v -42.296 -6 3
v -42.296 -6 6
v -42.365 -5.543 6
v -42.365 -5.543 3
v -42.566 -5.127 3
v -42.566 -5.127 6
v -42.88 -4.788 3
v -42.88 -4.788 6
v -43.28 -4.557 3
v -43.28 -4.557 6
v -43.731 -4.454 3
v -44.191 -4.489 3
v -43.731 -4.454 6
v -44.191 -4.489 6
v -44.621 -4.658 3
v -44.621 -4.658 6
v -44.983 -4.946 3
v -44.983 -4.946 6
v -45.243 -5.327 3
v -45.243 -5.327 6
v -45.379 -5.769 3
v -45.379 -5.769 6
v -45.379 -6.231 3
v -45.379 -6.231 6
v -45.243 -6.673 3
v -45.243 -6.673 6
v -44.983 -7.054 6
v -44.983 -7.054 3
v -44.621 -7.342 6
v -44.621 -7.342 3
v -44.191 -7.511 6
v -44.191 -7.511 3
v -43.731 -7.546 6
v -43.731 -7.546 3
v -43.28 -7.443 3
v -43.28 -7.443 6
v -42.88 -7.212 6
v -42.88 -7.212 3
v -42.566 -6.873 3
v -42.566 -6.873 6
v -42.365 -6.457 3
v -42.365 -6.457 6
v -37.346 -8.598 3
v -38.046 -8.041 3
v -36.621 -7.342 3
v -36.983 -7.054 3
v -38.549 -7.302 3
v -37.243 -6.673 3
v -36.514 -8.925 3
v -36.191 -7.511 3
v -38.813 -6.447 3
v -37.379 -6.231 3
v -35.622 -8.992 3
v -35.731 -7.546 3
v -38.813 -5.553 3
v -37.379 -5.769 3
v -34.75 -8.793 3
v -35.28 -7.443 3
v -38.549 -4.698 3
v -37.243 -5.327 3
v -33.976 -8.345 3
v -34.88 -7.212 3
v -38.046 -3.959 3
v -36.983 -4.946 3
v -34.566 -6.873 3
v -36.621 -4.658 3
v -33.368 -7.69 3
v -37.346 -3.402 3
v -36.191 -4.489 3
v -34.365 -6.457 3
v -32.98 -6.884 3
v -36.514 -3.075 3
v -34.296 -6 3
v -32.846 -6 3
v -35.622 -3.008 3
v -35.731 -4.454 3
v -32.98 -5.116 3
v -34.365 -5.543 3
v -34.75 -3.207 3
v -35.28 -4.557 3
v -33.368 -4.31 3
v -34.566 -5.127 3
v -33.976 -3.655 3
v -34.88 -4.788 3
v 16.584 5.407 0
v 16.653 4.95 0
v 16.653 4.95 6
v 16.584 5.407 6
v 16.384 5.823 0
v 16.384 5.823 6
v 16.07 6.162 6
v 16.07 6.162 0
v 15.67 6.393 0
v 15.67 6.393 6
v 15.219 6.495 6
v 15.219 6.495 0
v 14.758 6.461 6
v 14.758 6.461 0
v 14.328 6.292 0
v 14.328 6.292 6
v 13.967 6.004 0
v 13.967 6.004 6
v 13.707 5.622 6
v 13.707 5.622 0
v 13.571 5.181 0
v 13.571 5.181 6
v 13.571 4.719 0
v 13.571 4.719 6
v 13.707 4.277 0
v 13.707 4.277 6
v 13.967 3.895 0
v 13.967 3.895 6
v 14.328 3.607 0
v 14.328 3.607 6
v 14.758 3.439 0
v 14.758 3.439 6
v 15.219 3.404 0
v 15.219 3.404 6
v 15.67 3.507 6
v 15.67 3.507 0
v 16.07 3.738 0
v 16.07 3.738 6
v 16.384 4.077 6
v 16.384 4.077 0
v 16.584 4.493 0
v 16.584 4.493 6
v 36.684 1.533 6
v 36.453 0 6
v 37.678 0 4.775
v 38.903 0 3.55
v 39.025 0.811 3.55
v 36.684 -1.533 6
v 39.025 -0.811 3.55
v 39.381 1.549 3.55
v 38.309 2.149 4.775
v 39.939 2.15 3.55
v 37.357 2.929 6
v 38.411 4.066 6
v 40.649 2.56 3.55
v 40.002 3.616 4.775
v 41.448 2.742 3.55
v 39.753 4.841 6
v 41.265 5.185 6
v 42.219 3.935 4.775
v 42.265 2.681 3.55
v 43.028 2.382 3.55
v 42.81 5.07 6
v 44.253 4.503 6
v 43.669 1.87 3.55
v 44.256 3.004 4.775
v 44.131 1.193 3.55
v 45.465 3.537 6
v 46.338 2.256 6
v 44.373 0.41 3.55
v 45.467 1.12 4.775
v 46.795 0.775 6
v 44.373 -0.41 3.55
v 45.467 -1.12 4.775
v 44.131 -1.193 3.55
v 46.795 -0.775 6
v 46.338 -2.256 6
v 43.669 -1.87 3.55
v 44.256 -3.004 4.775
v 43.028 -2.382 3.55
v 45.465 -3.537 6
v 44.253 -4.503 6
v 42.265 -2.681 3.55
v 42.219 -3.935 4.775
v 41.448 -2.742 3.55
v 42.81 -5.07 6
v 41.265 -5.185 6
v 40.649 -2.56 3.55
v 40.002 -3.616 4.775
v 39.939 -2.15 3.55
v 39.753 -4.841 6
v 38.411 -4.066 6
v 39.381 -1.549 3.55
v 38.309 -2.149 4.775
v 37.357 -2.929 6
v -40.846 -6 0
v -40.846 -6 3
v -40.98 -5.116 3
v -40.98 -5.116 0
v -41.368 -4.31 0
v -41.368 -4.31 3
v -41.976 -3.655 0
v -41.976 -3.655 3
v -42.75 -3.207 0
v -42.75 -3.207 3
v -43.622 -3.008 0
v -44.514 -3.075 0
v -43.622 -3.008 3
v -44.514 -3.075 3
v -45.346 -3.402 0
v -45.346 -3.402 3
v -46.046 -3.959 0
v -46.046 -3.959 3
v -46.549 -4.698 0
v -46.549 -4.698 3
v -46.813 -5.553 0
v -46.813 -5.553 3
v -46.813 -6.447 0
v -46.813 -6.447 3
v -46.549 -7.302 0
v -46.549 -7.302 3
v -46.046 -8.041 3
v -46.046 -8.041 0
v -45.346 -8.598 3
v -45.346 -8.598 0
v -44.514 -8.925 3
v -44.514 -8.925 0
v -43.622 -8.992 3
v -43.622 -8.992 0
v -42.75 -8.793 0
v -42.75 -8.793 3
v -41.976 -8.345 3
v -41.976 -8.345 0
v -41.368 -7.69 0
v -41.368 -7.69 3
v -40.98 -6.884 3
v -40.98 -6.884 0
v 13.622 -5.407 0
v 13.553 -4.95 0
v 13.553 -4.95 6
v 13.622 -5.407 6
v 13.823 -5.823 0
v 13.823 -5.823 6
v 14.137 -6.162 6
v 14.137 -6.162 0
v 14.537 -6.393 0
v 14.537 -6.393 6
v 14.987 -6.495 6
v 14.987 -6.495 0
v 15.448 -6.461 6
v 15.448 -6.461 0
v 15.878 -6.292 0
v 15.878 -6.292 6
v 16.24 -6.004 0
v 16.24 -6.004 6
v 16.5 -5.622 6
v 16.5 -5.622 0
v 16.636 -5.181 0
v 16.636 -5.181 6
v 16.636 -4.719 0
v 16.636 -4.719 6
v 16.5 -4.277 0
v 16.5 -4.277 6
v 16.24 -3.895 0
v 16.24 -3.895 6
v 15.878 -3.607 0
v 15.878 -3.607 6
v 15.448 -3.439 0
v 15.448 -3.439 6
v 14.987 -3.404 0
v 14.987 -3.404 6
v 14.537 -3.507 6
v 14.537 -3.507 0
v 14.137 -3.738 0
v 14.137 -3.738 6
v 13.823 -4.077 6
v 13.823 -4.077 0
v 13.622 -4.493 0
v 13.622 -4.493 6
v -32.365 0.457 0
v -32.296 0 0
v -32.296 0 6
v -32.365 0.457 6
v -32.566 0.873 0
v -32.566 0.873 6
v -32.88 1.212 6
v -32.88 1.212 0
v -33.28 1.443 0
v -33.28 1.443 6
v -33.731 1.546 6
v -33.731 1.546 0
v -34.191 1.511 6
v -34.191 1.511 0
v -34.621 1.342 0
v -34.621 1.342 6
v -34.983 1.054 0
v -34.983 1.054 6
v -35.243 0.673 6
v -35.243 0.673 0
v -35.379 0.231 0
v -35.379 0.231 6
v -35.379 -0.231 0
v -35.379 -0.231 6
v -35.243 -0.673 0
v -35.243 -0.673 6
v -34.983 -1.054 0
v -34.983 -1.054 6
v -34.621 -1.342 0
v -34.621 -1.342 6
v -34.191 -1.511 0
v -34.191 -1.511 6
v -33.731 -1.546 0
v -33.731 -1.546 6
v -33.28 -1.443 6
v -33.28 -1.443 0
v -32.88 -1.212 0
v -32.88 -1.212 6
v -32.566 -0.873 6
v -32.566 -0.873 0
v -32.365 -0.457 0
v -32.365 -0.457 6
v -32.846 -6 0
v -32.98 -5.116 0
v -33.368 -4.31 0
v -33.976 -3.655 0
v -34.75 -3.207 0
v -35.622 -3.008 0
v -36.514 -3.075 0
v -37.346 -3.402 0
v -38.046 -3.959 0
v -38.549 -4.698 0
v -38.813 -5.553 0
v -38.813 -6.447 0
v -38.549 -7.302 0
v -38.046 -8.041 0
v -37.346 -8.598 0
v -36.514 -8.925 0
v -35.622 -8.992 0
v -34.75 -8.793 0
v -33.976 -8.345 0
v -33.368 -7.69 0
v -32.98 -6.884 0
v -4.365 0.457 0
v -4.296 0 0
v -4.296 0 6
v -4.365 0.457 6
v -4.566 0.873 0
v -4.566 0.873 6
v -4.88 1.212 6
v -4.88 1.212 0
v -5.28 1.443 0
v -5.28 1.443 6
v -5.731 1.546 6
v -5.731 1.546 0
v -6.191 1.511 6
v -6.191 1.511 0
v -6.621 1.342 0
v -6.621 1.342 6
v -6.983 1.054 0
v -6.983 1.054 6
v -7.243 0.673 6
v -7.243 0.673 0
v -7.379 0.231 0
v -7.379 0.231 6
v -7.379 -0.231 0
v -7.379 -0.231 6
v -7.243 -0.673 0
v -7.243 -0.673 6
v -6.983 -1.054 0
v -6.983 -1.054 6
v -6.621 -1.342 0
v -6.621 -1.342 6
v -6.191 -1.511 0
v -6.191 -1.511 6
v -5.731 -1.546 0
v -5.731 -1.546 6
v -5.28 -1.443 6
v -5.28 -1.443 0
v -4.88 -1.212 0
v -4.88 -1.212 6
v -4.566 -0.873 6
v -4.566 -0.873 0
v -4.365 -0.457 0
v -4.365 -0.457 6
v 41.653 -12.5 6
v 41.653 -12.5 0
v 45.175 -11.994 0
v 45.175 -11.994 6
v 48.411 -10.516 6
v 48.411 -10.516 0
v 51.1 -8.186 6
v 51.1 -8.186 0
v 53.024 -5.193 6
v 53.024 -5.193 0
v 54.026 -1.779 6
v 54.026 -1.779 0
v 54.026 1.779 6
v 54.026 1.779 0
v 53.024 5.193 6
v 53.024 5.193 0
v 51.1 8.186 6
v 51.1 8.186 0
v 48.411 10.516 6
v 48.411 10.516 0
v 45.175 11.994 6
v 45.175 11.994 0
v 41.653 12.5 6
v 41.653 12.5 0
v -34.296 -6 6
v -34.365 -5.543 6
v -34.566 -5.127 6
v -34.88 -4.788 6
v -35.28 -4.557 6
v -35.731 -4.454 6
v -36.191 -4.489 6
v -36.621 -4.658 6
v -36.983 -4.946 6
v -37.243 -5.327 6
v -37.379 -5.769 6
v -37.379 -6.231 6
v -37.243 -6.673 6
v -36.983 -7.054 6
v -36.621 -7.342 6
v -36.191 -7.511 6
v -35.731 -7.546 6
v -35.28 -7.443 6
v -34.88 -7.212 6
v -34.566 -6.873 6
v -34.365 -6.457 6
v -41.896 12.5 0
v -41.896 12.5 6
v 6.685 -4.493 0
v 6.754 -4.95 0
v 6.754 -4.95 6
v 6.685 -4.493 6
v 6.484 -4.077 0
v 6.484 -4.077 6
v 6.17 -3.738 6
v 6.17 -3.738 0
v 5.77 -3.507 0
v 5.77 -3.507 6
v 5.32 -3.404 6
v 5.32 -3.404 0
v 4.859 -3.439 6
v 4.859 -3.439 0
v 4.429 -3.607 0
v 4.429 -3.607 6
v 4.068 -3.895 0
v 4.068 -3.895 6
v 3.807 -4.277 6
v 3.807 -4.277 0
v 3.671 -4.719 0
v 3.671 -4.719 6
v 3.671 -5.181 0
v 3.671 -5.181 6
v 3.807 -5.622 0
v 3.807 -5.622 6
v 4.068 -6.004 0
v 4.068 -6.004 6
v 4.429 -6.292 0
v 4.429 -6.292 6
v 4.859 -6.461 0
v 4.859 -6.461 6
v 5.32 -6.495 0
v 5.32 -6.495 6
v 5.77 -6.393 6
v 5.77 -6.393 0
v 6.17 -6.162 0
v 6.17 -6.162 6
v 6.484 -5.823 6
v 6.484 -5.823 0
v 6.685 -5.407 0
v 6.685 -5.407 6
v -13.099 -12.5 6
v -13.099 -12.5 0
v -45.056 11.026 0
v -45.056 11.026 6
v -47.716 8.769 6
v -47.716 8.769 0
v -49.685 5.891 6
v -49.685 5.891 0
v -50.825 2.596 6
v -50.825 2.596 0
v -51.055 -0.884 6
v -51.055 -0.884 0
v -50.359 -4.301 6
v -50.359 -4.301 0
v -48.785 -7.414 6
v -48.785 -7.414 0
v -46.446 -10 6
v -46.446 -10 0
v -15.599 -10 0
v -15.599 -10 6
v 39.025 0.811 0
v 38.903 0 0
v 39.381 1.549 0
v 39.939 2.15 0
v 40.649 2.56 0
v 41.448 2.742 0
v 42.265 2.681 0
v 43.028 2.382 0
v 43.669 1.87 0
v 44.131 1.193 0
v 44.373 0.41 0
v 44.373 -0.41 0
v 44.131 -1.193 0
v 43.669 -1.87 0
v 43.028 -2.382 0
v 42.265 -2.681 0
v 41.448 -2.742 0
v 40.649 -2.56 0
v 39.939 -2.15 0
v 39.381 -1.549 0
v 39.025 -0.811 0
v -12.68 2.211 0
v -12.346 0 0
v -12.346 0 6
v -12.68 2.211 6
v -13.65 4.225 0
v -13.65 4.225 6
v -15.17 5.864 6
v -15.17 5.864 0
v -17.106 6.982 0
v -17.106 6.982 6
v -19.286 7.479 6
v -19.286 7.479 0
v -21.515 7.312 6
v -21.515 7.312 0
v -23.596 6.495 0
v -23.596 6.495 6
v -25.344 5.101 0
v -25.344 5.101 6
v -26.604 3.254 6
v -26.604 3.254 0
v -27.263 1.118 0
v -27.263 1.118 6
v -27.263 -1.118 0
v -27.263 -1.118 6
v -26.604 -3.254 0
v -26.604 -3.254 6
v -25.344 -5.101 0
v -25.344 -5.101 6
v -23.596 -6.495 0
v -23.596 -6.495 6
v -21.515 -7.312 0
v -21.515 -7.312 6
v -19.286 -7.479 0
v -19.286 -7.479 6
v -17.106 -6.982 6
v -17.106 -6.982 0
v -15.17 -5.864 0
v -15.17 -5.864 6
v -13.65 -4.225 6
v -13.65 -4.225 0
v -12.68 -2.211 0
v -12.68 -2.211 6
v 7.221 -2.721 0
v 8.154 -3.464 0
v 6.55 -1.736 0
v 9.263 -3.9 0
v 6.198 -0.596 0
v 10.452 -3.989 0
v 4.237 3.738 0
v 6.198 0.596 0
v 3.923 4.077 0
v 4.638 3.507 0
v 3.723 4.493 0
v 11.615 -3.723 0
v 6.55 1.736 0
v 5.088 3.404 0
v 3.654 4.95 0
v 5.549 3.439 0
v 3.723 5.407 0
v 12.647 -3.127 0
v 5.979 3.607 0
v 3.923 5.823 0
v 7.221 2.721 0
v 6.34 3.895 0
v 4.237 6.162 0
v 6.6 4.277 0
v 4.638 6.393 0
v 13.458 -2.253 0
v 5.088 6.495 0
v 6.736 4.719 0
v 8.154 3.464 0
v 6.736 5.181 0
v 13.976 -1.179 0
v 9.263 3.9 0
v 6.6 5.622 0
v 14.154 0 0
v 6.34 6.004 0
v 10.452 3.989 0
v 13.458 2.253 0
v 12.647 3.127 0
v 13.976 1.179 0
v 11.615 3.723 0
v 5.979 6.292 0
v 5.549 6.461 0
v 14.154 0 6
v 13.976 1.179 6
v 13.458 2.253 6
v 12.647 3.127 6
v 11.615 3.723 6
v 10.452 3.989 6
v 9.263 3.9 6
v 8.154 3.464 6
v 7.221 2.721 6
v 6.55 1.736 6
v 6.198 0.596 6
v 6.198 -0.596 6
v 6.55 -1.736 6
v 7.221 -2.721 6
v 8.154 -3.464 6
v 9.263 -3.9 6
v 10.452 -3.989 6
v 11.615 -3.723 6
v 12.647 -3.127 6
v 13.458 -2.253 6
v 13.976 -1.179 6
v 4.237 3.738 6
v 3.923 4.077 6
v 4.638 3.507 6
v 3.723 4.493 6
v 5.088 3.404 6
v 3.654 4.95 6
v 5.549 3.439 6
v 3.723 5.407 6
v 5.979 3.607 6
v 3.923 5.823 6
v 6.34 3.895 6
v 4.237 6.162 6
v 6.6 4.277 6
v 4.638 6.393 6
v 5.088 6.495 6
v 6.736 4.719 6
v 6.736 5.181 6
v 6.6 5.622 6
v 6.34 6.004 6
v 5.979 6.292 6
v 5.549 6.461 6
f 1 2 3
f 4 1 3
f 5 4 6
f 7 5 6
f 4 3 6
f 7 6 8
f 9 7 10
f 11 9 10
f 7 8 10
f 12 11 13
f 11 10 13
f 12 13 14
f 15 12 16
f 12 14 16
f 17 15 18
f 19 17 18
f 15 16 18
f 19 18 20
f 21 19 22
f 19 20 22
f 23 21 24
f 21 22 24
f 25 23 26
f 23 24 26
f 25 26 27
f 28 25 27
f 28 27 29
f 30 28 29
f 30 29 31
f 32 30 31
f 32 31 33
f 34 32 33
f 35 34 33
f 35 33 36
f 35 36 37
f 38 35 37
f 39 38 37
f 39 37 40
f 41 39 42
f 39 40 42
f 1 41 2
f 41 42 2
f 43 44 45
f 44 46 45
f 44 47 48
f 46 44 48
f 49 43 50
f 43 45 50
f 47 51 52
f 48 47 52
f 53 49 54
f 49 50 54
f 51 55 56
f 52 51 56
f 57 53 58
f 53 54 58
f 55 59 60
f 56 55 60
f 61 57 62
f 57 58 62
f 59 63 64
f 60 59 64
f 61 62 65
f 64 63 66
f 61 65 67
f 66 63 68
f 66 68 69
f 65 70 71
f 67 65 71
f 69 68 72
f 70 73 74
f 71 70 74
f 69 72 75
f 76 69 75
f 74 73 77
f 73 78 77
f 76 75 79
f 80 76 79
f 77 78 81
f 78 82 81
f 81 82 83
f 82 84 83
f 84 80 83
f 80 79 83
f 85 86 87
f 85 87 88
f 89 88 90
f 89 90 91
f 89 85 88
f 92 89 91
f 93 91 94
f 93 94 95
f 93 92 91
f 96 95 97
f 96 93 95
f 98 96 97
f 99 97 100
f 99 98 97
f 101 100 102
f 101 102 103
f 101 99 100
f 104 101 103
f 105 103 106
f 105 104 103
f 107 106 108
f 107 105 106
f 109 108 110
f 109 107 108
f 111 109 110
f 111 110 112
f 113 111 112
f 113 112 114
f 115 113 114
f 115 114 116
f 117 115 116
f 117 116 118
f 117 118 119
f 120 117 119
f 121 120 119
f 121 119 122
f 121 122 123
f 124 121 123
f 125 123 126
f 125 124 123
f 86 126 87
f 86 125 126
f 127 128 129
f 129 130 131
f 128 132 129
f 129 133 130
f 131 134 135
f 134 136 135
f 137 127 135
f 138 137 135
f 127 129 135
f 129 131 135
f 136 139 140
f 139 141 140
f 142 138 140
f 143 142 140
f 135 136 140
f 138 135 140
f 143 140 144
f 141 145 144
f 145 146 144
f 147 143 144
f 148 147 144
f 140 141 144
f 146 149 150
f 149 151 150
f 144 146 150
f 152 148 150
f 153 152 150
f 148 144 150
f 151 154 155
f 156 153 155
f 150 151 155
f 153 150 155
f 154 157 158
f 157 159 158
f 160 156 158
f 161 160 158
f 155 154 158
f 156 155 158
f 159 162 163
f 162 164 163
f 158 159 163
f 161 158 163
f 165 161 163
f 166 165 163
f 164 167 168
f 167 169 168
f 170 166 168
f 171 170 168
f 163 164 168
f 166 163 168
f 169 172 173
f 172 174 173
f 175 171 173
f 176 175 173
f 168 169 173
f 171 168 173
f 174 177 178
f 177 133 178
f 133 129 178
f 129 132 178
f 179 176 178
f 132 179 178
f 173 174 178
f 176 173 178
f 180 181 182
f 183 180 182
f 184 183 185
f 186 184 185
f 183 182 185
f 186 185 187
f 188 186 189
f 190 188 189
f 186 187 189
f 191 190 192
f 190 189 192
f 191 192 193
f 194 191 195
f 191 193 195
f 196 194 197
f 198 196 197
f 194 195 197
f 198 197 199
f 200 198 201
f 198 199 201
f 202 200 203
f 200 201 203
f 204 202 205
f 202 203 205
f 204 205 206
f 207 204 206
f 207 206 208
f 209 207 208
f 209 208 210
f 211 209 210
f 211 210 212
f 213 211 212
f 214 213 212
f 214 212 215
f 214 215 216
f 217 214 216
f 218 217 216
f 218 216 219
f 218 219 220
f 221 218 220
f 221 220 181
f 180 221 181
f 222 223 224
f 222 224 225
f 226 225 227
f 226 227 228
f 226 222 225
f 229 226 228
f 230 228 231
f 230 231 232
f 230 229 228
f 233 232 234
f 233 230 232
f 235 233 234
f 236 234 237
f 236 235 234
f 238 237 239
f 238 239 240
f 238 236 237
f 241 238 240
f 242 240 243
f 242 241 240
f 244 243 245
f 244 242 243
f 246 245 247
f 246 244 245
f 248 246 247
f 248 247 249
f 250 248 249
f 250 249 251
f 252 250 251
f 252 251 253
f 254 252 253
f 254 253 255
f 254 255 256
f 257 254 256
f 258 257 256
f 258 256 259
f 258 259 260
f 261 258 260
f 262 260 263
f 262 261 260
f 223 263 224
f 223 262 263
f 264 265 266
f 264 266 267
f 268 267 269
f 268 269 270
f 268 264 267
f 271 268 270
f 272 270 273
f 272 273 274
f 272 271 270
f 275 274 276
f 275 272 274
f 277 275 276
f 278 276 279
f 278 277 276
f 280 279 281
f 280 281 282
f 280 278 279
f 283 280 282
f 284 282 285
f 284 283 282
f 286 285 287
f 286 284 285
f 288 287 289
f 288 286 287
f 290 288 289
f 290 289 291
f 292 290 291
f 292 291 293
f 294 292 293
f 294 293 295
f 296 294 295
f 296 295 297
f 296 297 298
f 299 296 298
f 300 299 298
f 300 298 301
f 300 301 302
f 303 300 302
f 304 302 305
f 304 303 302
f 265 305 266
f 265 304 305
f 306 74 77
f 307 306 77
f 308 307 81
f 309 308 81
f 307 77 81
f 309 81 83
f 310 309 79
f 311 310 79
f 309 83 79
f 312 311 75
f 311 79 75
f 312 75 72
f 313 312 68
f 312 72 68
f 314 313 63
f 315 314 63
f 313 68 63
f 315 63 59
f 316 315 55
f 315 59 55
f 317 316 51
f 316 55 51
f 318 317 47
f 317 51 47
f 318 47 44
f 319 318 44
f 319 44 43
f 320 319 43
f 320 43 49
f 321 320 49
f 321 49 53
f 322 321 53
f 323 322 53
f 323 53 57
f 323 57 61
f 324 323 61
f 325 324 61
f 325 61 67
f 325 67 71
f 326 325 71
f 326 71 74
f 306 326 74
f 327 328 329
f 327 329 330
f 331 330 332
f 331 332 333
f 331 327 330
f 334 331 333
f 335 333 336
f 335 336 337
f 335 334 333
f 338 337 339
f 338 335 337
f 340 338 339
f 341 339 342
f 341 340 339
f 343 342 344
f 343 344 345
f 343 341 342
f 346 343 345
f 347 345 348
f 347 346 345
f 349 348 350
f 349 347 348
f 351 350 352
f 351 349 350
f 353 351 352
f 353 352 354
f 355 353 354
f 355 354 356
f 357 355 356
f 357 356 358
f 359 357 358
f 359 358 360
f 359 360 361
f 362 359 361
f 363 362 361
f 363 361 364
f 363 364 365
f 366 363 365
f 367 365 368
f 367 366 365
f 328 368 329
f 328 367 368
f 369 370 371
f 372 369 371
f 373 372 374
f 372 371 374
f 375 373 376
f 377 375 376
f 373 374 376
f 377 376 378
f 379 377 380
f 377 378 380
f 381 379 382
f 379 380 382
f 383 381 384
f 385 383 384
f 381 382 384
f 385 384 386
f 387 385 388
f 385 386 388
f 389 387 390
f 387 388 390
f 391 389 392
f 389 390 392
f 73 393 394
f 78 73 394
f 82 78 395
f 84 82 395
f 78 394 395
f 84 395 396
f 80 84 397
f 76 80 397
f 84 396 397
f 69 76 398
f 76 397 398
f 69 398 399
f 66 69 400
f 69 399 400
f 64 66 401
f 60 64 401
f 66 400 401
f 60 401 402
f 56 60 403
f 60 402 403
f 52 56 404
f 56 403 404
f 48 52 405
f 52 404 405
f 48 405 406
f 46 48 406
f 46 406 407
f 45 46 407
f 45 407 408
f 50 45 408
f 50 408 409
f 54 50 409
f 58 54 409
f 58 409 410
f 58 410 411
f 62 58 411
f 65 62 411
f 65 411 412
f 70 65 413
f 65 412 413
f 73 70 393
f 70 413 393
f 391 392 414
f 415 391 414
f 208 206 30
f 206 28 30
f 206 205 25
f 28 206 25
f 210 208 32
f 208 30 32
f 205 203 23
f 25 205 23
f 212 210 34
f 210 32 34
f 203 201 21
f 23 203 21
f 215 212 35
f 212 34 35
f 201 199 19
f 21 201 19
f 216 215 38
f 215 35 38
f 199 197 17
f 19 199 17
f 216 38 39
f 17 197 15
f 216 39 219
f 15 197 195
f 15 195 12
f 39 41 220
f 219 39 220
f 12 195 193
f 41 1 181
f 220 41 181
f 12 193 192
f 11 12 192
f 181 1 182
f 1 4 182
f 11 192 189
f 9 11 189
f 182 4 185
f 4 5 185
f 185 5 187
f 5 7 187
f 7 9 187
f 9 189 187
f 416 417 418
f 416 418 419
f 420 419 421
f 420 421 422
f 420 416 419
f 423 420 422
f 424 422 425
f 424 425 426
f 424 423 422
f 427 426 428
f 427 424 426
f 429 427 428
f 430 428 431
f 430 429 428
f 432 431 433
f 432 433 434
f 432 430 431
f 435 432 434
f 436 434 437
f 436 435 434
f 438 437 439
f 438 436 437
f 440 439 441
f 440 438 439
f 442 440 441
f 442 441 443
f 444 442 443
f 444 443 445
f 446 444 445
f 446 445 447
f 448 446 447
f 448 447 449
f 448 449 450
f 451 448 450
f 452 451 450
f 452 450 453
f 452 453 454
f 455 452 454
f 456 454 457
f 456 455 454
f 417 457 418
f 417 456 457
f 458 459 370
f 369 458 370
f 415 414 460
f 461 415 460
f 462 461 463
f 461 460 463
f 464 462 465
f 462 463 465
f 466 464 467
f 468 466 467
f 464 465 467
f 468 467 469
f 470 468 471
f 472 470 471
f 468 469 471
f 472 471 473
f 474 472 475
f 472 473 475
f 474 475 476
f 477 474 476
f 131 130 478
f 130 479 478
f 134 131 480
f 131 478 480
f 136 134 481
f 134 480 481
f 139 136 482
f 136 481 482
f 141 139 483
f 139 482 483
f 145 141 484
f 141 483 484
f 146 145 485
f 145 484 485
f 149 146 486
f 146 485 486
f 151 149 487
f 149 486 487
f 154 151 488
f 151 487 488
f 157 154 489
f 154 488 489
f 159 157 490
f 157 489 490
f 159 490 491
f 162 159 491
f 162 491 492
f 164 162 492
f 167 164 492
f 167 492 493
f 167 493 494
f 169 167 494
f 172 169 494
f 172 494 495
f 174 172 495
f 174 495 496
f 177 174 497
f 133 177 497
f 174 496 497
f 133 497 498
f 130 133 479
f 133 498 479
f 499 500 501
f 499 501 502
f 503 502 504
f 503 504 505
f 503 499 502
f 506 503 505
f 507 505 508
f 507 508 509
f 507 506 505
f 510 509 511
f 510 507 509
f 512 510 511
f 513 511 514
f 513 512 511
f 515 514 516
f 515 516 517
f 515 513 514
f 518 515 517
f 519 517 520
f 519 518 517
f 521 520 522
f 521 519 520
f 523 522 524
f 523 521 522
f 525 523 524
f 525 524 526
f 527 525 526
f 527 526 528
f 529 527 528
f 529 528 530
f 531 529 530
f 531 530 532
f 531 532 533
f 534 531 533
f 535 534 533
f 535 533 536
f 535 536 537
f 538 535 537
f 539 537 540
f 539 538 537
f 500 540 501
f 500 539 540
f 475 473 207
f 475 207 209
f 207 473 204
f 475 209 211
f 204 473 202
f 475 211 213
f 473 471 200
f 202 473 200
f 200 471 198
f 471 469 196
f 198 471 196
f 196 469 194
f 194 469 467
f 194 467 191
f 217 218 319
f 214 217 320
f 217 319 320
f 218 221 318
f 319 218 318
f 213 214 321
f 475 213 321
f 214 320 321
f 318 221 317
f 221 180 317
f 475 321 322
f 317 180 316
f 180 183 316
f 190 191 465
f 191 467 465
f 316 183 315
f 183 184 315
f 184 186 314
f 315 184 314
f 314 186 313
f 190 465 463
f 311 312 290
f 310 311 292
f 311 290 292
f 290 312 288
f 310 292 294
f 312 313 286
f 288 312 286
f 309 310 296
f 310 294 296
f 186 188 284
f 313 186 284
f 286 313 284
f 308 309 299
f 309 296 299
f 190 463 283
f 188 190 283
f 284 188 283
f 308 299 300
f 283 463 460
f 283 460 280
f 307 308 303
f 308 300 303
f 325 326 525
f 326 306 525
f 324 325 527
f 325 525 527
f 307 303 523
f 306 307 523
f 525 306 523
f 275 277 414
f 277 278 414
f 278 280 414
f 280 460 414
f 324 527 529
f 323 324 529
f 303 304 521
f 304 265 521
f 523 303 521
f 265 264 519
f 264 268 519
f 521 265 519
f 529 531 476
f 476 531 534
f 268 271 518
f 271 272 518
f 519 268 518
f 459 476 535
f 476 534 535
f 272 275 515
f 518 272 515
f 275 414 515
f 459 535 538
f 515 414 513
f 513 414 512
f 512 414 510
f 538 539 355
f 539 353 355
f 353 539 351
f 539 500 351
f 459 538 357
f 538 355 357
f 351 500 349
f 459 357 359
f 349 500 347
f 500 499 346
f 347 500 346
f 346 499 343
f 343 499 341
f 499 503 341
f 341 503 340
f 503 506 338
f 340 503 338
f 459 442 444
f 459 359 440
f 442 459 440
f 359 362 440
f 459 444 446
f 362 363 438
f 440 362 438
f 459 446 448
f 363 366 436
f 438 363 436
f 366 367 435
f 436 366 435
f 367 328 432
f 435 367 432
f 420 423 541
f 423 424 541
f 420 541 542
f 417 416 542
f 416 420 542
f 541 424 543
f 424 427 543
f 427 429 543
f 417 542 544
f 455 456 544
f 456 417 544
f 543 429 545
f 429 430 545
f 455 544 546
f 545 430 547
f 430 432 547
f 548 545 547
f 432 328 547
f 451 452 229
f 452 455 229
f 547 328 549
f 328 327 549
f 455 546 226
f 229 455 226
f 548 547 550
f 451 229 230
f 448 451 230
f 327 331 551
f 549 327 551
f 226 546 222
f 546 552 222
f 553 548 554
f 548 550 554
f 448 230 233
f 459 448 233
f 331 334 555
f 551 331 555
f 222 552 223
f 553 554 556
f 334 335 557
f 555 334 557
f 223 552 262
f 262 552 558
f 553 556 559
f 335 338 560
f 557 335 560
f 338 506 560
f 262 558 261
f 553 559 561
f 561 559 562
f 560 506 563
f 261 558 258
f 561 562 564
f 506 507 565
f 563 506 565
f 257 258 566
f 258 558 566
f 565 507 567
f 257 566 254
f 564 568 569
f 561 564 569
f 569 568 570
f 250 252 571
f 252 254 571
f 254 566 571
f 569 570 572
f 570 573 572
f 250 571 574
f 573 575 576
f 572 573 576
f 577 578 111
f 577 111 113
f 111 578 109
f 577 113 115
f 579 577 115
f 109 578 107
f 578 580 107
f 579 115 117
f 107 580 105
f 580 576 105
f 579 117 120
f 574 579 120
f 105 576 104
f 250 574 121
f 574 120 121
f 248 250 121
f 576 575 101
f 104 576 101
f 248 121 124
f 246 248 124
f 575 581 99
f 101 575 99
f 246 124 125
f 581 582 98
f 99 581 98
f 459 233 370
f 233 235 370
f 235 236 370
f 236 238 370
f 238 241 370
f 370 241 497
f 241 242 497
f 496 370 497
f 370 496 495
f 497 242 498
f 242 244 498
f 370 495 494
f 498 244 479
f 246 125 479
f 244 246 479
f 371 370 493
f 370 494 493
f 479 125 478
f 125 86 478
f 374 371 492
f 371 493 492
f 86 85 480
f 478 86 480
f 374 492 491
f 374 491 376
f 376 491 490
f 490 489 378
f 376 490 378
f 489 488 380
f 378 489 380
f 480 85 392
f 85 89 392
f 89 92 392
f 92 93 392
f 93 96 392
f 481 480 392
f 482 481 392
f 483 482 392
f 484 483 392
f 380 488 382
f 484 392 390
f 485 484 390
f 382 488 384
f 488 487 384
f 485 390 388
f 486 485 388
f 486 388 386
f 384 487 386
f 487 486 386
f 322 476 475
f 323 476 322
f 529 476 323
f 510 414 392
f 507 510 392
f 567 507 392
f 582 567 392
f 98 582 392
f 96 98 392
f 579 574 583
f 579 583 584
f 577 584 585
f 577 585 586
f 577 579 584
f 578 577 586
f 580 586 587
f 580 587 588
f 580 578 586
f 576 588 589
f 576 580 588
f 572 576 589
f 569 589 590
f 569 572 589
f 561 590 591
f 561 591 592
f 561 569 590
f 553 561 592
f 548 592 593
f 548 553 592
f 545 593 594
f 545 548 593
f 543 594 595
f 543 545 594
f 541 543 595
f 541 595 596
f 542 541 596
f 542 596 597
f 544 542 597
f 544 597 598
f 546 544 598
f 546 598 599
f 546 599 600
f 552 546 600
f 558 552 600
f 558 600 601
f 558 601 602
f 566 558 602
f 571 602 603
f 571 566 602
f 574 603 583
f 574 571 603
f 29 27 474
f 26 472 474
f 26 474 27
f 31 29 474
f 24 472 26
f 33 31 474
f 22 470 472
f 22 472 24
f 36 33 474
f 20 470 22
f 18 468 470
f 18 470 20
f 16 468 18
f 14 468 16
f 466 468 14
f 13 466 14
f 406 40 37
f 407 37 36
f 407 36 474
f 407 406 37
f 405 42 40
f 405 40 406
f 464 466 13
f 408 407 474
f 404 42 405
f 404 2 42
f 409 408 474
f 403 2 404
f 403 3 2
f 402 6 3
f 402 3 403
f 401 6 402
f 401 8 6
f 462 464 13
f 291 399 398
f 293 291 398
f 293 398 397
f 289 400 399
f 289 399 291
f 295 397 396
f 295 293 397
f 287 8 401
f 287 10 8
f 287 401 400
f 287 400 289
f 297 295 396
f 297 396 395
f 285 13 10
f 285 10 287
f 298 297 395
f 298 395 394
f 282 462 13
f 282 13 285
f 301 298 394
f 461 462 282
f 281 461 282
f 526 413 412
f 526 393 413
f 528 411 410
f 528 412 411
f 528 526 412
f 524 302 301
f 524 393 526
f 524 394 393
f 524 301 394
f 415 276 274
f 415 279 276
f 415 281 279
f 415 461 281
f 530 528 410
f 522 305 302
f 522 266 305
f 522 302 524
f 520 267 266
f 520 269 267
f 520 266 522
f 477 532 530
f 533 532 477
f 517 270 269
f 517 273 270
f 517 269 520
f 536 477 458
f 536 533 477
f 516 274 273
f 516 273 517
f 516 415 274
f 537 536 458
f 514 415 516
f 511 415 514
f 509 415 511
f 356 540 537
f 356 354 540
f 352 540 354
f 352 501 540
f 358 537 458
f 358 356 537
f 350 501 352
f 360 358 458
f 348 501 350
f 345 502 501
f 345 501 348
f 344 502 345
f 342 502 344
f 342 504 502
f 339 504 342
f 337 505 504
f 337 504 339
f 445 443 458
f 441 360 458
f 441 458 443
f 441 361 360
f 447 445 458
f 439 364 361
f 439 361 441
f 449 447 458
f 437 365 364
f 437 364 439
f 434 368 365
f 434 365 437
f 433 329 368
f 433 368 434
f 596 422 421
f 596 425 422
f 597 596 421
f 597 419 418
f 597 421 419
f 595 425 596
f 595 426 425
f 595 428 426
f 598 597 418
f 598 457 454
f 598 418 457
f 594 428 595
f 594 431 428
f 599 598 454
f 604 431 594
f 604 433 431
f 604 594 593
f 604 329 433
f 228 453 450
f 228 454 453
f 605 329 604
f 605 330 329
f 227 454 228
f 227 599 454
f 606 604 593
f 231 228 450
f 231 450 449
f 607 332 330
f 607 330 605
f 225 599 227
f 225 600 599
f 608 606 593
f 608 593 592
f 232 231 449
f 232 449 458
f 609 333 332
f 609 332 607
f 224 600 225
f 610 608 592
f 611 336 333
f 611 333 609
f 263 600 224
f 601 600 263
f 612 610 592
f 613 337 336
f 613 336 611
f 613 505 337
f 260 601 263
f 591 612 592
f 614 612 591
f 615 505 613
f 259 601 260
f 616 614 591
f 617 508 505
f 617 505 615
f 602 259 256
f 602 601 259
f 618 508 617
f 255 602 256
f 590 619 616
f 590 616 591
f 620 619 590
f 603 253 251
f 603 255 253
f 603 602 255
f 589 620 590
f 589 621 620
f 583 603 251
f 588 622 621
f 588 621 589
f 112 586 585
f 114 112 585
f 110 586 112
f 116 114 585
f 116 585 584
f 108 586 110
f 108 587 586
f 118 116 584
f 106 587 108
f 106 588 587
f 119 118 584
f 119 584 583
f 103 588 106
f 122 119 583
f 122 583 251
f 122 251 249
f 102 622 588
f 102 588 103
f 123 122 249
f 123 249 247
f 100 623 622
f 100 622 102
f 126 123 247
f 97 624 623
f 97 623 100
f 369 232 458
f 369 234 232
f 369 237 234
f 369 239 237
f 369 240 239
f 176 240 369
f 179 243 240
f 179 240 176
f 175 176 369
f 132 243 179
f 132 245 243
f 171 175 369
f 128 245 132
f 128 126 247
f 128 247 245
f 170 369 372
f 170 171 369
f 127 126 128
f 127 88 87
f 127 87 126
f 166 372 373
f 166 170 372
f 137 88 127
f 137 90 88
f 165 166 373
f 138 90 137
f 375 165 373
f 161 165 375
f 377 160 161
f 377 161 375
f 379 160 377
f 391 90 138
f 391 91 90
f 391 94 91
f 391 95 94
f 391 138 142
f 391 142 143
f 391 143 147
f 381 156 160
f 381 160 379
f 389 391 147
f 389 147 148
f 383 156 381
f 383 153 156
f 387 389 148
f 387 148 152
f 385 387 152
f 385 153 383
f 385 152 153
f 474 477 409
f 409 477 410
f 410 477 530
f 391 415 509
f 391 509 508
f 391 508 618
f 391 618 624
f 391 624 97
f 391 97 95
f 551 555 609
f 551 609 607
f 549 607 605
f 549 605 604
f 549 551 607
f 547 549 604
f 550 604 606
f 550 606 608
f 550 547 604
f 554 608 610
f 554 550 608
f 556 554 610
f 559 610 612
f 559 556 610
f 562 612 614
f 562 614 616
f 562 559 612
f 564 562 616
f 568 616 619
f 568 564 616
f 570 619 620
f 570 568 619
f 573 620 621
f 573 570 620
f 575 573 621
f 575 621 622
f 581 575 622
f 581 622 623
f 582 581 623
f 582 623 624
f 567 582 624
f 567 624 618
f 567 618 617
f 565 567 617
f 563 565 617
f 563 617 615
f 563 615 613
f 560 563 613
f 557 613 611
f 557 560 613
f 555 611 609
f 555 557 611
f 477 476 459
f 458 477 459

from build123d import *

# Parameters (mm, degrees)
SKETCH1_R                                       = 4
SKETCH1_R_2                                     = 1.55
SKETCH1_R_3                                     = 7.5
BOSS_EXTRUDE1_DEPTH                             = 6
CSK_FOR_M5_FLAT_HEAD_MACHINE_SCREW1_D           = 5.5
CSK_FOR_M5_FLAT_HEAD_MACHINE_SCREW1_DEPTH       = 13.347633298
CSK_FOR_M5_FLAT_HEAD_MACHINE_SCREW1_CSINK_D     = 10.4
CSK_FOR_M5_FLAT_HEAD_MACHINE_SCREW1_CSINK_ANGLE = 90
CSK_FOR_M5_FLAT_HEAD_MACHINE_SCREW1_TIP         = 1.652366702
SKETCH7_R                                       = 1.55
CUT_EXTRUDE1_DEPTH                              = 3
SKETCH8_R                                       = 3
CUT_EXTRUDE2_DEPTH                              = 56.658073272


with BuildPart() as part:
    # Sketch1 → Boss-Extrude1 (new body)
    with BuildSketch(Plane.XY):
        with BuildLine():
            Line((-46.445530028, -10), (-15.598952553, -10))
            Line((-15.598952553, -10), (-13.098952553, -12.5))
            Line((-13.098952553, -12.5), (41.653218929, -12.5))
            ThreePointArc((41.653218929, -12.5), (54.153218929, 0), (41.653218929, 12.5))
            Line((41.653218929, 12.5), (-41.895881711, 12.5))
            ThreePointArc((-41.895881711, 12.5), (-50.825462961, 2.595635751), (-46.445530028, -10))
        make_face()
        with Locations((10.153527864, 0)):
            Circle(SKETCH1_R, mode=Mode.SUBTRACT)
        with Locations((15.103275332, 4.949747468)):
            Circle(SKETCH1_R_2, mode=Mode.SUBTRACT)
        with Locations(Location((5.203780395, 4.949747468, 0), (0, 0, 180))):
            Circle(SKETCH1_R_2, mode=Mode.SUBTRACT)
        with Locations(Location((15.103275332, -4.949747468, 0), (0, 0, 180))):
            Circle(SKETCH1_R_2, mode=Mode.SUBTRACT)
        with Locations((5.203780395, -4.949747468)):
            Circle(SKETCH1_R_2, mode=Mode.SUBTRACT)
        with Locations((-33.846472136, 0)):
            Circle(SKETCH1_R_2, mode=Mode.SUBTRACT)
        with Locations((-19.846472136, 0)):
            Circle(SKETCH1_R_3, mode=Mode.SUBTRACT)
        with Locations((-5.846472136, 0)):
            Circle(SKETCH1_R_2, mode=Mode.SUBTRACT)
    extrude(amount=BOSS_EXTRUDE1_DEPTH)

    # CSK for M5 Flat Head Machine Screw1
    with Locations(Plane.XY.offset(6)):
        with Locations((41.653218929, 0)):
            CounterSinkHole(CSK_FOR_M5_FLAT_HEAD_MACHINE_SCREW1_D / 2, CSK_FOR_M5_FLAT_HEAD_MACHINE_SCREW1_CSINK_D / 2, depth=CSK_FOR_M5_FLAT_HEAD_MACHINE_SCREW1_DEPTH, counter_sink_angle=CSK_FOR_M5_FLAT_HEAD_MACHINE_SCREW1_CSINK_ANGLE)
            with Locations((0, 0, -(CSK_FOR_M5_FLAT_HEAD_MACHINE_SCREW1_DEPTH + CSK_FOR_M5_FLAT_HEAD_MACHINE_SCREW1_TIP / 2))):  # 118° drill point
                Cone(0, CSK_FOR_M5_FLAT_HEAD_MACHINE_SCREW1_D / 2, CSK_FOR_M5_FLAT_HEAD_MACHINE_SCREW1_TIP, mode=Mode.SUBTRACT)

    # Sketch7 → Cut-Extrude1 (cut)
    with BuildSketch(Plane.XY.offset(6)):
        with Locations((-43.846472136, -6)):
            Circle(SKETCH7_R)
        with Locations((-35.846472136, -6)):
            Circle(SKETCH7_R)
    extrude(amount=-CUT_EXTRUDE1_DEPTH, mode=Mode.SUBTRACT)

    # Sketch8 → Cut-Extrude2 (cut, through all)
    with BuildSketch(Plane.XY.offset(3)):
        with Locations((-35.846472136, -6)):
            Circle(SKETCH8_R)
        with Locations((-43.846472136, -6)):
            Circle(SKETCH8_R)
    extrude(amount=-CUT_EXTRUDE2_DEPTH, mode=Mode.SUBTRACT)


solid = part.part
